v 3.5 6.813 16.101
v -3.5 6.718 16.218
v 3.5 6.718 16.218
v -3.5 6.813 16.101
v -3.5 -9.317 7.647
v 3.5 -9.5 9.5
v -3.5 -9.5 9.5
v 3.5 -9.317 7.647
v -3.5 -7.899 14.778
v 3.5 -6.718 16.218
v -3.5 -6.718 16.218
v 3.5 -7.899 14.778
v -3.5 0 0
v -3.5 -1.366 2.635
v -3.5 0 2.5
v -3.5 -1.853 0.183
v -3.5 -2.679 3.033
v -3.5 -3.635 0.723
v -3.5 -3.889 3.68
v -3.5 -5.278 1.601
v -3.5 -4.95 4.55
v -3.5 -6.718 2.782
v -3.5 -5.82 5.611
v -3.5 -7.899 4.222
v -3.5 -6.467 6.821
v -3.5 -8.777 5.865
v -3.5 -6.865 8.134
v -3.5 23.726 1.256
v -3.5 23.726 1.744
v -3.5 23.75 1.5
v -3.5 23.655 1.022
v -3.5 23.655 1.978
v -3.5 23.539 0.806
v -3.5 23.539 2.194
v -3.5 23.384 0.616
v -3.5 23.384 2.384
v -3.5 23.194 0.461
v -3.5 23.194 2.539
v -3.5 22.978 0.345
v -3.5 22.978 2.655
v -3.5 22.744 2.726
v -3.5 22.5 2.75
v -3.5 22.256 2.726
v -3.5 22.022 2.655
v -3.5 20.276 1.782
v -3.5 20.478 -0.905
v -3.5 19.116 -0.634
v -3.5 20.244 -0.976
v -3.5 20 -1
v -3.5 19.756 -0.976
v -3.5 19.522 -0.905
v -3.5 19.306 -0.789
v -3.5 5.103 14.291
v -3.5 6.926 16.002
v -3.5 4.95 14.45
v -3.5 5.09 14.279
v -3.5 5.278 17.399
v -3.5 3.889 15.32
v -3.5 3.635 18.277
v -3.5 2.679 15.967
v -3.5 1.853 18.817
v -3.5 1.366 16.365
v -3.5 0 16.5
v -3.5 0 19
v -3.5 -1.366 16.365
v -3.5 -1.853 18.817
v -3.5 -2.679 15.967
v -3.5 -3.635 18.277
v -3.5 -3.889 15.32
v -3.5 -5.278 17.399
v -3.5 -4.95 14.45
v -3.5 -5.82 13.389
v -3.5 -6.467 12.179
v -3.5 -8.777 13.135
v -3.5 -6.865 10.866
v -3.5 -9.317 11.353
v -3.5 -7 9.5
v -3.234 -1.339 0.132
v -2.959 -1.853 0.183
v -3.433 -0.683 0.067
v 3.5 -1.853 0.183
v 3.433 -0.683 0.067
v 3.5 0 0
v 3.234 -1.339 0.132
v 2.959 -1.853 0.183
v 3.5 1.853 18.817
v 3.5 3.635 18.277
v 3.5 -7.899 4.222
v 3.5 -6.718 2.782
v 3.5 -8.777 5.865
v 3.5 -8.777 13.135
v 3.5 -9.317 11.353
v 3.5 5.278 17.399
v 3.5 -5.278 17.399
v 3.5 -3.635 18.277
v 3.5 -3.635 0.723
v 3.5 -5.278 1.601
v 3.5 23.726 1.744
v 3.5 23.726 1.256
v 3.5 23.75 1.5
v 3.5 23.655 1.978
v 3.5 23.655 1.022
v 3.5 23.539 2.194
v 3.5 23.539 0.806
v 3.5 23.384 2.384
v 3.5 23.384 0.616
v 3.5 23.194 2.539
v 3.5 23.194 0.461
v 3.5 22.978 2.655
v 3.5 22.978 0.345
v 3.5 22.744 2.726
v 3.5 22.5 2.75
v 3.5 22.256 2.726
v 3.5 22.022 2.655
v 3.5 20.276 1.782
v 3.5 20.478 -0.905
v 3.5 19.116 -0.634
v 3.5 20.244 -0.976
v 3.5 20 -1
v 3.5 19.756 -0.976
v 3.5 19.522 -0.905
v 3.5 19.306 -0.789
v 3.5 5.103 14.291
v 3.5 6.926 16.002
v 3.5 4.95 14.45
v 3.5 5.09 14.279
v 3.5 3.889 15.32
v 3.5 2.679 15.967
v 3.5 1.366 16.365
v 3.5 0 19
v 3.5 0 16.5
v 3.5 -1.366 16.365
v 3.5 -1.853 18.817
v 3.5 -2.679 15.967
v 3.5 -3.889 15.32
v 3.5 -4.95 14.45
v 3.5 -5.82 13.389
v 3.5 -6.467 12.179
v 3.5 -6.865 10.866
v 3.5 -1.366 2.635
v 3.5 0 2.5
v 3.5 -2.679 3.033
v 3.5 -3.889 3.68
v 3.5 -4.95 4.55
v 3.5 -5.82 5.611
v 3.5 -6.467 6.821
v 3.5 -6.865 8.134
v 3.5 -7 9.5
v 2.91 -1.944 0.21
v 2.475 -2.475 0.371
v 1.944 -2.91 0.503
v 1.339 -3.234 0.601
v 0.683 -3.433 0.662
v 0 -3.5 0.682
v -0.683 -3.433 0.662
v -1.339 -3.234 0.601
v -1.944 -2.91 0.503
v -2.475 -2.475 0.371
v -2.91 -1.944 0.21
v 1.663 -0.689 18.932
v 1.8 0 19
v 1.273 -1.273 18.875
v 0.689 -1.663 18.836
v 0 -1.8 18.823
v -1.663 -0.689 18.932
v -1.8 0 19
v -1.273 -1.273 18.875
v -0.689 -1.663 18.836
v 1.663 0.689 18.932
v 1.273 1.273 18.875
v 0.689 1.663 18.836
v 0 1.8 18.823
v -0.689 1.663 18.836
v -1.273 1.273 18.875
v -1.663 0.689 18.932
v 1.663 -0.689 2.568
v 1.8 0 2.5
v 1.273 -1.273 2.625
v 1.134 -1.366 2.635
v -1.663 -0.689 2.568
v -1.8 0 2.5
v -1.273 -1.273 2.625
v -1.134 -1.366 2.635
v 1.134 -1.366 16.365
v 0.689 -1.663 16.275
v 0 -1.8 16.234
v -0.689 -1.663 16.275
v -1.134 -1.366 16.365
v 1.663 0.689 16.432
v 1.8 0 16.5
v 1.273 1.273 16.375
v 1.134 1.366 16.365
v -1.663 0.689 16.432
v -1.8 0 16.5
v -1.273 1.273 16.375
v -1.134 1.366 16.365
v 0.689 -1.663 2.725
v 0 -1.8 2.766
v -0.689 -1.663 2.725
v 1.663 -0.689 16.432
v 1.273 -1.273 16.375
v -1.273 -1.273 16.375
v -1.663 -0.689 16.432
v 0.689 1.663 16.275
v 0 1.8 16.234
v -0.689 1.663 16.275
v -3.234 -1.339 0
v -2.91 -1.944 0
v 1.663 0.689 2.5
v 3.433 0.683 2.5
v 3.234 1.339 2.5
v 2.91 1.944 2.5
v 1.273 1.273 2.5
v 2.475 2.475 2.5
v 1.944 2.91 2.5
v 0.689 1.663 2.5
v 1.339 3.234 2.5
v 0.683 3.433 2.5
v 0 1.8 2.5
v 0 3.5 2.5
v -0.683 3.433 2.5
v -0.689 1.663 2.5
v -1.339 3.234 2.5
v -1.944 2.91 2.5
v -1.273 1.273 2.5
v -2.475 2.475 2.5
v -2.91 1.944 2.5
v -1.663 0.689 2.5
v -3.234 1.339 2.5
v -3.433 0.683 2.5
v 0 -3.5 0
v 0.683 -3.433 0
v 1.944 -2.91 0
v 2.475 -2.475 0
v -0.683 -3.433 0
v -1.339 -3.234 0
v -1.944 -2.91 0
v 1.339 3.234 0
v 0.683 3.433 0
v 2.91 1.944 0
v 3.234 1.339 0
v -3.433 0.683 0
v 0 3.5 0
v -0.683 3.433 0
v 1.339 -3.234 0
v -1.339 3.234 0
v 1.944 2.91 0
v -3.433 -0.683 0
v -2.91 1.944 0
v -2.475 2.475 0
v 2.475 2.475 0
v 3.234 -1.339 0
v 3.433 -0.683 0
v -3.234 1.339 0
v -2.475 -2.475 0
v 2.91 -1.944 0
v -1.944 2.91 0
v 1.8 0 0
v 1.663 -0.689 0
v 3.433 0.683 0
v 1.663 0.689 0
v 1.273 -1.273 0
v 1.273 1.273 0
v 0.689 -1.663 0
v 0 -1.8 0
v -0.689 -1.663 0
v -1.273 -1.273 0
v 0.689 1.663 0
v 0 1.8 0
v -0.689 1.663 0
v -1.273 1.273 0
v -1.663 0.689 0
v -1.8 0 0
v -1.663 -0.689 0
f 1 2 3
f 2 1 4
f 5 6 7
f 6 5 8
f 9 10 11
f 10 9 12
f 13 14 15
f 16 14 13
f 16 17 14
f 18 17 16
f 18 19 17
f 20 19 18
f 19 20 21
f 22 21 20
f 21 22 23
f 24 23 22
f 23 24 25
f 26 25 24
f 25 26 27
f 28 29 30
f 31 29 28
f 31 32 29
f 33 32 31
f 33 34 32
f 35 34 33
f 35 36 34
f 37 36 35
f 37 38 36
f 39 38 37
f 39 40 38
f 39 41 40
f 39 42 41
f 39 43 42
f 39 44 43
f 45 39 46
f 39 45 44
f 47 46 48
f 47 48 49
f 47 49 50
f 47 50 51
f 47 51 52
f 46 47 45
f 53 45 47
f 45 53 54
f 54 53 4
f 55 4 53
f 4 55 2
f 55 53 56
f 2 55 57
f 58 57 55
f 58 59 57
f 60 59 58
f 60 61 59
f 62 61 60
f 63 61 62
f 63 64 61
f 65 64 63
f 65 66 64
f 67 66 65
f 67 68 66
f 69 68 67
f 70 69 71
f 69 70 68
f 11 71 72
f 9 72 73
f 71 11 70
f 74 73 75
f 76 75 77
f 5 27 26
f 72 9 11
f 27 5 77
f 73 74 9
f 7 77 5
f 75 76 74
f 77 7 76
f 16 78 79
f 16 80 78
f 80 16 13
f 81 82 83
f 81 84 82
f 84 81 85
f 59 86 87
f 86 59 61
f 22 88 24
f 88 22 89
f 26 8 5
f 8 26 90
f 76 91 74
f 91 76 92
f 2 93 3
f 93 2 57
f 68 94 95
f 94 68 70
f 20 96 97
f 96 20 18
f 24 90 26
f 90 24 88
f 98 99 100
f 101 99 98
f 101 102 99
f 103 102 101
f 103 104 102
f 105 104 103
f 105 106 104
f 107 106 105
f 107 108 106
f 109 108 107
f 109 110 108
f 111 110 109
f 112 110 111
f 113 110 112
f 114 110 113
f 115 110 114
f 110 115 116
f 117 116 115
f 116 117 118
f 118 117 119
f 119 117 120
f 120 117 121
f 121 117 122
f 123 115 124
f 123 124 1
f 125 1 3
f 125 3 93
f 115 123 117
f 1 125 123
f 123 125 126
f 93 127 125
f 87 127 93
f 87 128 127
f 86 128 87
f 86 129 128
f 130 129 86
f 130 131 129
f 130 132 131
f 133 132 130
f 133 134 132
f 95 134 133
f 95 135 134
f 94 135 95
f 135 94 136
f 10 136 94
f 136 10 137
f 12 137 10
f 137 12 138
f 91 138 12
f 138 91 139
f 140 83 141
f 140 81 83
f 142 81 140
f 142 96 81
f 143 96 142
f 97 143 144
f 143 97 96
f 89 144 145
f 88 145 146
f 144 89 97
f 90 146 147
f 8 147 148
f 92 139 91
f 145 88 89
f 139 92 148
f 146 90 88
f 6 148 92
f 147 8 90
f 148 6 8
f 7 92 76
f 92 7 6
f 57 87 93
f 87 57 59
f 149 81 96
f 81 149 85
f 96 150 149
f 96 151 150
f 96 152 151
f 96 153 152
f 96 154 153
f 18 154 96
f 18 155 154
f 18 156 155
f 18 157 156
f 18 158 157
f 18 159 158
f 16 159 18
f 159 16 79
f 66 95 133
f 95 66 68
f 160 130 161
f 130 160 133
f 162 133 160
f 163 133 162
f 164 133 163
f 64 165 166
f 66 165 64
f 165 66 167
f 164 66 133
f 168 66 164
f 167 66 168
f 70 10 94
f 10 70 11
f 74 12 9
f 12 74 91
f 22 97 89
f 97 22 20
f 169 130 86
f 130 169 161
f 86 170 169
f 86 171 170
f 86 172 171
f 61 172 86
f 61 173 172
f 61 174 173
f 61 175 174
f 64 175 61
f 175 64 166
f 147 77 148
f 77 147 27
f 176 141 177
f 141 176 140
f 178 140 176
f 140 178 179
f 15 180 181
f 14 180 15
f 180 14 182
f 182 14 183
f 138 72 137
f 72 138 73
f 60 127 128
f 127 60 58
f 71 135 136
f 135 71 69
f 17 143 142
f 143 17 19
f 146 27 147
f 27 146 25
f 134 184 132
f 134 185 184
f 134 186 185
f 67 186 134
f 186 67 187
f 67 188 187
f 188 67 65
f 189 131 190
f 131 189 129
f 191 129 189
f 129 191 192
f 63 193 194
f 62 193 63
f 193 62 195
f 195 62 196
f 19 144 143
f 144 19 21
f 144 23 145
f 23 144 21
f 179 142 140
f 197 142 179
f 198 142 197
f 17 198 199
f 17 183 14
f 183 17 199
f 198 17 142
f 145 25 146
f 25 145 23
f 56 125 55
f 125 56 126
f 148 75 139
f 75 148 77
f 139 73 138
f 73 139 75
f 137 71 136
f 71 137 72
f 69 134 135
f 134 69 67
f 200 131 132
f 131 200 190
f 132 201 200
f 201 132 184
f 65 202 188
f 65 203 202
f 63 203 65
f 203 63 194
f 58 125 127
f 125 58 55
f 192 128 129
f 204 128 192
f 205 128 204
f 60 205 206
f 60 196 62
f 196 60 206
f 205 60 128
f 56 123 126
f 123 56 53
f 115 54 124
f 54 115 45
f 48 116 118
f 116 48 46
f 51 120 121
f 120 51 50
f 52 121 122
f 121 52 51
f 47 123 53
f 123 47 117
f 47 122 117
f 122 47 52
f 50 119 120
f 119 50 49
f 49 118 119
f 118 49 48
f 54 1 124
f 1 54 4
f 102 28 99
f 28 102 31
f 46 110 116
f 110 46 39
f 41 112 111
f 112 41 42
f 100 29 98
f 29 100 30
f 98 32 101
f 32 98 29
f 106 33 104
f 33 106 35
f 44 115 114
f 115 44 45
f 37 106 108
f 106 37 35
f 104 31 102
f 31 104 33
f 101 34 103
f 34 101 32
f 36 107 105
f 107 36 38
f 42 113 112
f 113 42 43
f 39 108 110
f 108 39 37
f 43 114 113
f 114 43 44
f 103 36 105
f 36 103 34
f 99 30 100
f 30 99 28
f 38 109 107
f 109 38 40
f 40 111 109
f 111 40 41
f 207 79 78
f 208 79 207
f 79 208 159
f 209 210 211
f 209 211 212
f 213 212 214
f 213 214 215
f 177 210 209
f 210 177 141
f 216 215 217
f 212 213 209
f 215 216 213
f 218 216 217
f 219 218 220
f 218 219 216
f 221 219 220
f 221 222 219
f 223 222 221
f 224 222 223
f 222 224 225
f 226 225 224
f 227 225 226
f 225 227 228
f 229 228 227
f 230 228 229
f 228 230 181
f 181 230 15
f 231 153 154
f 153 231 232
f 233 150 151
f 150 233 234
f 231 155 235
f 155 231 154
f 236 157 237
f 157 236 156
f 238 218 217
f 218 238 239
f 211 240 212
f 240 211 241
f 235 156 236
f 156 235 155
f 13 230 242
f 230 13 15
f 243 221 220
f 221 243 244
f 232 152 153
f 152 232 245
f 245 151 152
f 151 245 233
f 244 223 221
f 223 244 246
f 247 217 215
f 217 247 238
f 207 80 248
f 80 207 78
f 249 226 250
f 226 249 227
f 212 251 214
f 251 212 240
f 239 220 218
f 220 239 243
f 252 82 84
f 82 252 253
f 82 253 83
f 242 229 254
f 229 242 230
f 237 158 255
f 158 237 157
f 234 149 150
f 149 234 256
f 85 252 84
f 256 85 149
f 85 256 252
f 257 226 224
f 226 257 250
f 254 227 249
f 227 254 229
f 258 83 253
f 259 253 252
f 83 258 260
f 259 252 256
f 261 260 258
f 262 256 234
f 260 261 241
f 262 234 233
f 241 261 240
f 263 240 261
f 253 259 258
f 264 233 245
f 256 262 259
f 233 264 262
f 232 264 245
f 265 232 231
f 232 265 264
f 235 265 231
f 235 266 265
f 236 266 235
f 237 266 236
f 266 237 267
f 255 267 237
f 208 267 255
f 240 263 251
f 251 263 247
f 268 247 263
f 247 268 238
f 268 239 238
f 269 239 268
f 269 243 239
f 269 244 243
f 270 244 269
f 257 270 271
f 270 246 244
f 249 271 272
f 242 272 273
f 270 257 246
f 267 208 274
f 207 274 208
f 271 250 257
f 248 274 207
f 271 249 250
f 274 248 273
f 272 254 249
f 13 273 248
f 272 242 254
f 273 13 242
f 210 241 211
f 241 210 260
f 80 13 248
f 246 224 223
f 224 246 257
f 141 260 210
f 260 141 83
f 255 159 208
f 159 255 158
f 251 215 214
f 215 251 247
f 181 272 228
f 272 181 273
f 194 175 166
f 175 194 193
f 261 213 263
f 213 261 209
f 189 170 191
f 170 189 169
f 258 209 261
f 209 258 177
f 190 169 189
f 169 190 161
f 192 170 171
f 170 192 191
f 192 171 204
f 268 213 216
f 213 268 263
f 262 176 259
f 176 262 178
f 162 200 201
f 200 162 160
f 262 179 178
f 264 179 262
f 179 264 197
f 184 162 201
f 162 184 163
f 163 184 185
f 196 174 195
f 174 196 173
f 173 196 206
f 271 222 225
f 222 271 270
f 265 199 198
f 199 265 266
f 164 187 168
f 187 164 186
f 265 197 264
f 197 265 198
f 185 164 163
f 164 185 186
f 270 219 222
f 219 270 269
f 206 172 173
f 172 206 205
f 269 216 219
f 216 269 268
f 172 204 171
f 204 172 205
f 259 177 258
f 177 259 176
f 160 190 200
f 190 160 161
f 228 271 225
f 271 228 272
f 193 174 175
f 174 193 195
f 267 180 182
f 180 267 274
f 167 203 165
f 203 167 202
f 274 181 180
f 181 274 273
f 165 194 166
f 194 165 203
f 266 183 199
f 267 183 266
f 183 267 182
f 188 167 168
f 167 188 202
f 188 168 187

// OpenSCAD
/******************************************************************
*                                                                 *
* OpenFlexure Microscope: Optics unit                             *
*                                                                 *
* This is part of the OpenFlexure microscope, an open-source      *
* microscope and 3-axis translation stage.  It gets really good   *
* precision over a ~10mm range, by using plastic flexure          *
* mechanisms.                                                     *
*                                                                 *
* (c) Richard Bowman, January 2016                                *
* Released under the CERN Open Hardware License                   *
*                                                                 *
******************************************************************/


use <utilities.scad>;

//this is for mini culture plates, 39mm outer diameter and 12.4mm high
sample=[0,19/2,12.4-1.5-9]; //position of clamping point relative to bolt

$fn=32;


//rotate([0,90,0]) 
module sample_clip(sample,t=2.5,w=6,roc=-1,slope=30){
    roc = roc>0 ? roc : sample[2]/2 + sample[1]*sin(slope) - t/2; //radius of curvature
    a = sqrt(pow(sample[1], 2) + pow(sample[2] - roc - t/2, 2));
      //a is the distance from the contact-point cylinder to the 
      //centre of the curved part
    angle = acos( (roc + t/2) / a ) + atan((sample[2] - roc - t/2)/sample[1]); //angle through which we must rotate the join between
    //curved part and straight part
    echo("angle set to:",angle);
    /*angle = 75; //angle of straight part to the vertical
    roc =*/ 
    difference(){
        union(){
            //anchor to stage
            hull() repeat([sample[0],0,0],2) cylinder(r=w/2,h=t);
            
            translate([0,0,roc+t]) rotate([0,90,0]) difference(){
                cylinder(r=roc+t,h=w,center=true);
                cylinder(r=roc,h=999,center=true);
                translate([0,0,-99]) rotate(0) cube([999,999,999]);
                translate([0,0,-99]) rotate(angle) cube([999,999,999]);
            }
            sequential_hull(){
                translate([0,0,roc+t]) rotate([0,90,0]) rotate(angle) translate([0,roc+t/2,0]) cylinder(r=t/2,h=w,center=true);
                translate([0,sample[1],sample[2]+t/2]) rotate([0,90,0]) cylinder(r=t/2,h=w,center=true);
                translate([0,sample[1]+t,sample[2]+t]) rotate([0,90,0]) cylinder(r=t/2,h=w,center=true);
            }
            
        }
        cylinder(r=3/2*1.2,h=999,center=true,$fn=16);
    }
}


//this is for mini culture plates, 39mm outer diameter and 12.4mm high
//sample_clip([0,19/2+3,12.4-1.5],slope=7.5); //mini culture dish

//for a standard microscope slide, use [0,20,0] to clamp from both holes next to one leg
sample_clip([0,20,-1], w=7, roc=7); //microscope slide
/*
translate([10,0,0]) sample_clip([0,20,0]);
translate([20,0,0]) sample_clip([0,20,10]);
translate([30,0,0]) sample_clip([0,10,3]);
translate([40,0,0]) sample_clip([0,10,15]);
*/
